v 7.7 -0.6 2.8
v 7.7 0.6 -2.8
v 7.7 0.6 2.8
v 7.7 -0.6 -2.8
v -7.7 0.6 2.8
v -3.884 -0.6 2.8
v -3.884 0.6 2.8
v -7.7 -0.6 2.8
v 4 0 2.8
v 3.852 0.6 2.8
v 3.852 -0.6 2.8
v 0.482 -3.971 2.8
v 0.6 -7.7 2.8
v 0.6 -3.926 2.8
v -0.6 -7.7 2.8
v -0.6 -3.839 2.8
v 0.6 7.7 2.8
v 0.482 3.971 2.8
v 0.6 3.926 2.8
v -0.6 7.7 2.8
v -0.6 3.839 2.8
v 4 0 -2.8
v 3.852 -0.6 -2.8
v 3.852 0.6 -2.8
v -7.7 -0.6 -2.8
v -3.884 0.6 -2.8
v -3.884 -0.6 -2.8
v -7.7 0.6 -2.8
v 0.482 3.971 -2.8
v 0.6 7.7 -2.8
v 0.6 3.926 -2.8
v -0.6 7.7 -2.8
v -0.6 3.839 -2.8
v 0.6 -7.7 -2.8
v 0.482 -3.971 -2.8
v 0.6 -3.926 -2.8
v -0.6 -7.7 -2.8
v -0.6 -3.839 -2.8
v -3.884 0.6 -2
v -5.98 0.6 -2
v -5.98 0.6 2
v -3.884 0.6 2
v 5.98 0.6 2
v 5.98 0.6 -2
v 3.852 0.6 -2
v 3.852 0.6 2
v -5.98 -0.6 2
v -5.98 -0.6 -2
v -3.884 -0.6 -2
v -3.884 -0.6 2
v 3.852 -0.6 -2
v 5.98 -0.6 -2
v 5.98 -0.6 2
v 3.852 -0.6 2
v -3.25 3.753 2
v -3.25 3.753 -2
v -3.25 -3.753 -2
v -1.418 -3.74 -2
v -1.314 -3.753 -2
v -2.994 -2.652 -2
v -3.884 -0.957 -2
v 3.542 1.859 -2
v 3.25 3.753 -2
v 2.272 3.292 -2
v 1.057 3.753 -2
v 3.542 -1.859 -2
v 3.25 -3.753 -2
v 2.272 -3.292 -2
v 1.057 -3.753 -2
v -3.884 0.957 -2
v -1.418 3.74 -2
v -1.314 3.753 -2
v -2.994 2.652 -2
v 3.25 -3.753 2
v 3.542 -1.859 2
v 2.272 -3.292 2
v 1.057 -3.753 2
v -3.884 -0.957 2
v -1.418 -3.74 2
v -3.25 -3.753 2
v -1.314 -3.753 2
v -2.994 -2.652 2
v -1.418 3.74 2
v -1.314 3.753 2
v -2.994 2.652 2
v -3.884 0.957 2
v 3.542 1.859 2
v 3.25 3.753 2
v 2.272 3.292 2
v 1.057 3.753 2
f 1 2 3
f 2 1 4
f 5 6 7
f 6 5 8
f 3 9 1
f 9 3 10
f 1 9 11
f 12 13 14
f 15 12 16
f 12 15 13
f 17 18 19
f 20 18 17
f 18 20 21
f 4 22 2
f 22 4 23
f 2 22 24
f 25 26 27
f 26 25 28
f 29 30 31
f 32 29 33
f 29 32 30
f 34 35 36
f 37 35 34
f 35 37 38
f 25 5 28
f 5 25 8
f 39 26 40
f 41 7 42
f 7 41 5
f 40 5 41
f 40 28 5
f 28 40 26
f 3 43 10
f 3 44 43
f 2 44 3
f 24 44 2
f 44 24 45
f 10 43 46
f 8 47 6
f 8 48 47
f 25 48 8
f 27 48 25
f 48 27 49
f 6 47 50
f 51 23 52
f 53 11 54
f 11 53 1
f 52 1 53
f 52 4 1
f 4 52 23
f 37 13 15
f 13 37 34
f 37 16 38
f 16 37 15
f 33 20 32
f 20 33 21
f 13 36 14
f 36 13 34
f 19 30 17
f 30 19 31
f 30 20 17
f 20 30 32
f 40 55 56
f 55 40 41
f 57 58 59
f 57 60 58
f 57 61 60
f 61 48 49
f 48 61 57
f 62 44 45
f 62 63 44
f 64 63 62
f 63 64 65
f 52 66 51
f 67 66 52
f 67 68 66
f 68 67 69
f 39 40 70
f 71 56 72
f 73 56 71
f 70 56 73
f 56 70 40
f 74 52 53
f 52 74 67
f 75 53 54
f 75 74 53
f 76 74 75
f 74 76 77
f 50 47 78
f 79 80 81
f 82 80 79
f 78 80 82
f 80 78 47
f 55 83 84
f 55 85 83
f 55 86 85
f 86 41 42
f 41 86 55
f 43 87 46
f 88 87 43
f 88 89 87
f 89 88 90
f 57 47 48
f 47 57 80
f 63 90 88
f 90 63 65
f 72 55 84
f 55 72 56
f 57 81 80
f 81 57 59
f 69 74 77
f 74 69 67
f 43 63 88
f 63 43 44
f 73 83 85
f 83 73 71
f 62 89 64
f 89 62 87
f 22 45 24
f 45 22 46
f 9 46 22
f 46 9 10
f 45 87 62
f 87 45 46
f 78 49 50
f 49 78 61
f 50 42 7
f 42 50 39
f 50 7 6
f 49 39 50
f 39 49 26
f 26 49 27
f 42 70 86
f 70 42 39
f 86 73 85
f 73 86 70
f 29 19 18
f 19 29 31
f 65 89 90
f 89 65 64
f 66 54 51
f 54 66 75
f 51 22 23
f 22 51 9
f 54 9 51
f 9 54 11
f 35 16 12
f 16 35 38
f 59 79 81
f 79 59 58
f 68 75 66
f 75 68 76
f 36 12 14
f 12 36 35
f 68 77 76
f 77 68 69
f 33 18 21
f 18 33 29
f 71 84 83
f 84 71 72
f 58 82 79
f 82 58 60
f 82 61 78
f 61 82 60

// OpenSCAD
// Parameters
thread_diameter = 8.0; //[4.0:16.0:0.1]
across_flats    = 13.0; //[6.5:26.0:0.1]
thickness       = 4.0; //[2.0:8.0:0.1]
hole_clearance  = 0.0; //[0.0:1.0:0.05]

// Small overlap to guarantee watertight unions / connections
overlap = 1.2; //[1.0:2.0:0.1]
eps     = 0.8; //[0.2:2.0:0.1]

// Hexagonal Nut Profile (flat-to-flat)
module flat_to_flat_hex_profile(h=thickness) {
  linear_extrude(height=h, center=true)
    polygon(points=[
      [ across_flats/2, 0],
      [ across_flats/4,  (across_flats/2)*tan(30)],
      [-across_flats/4,  (across_flats/2)*tan(30)],
      [-across_flats/2, 0],
      [-across_flats/4, -(across_flats/2)*tan(30)],
      [ across_flats/4, -(across_flats/2)*tan(30)]
    ]);
}

// Thread Through Hole
module thread_through_hole(h=thickness) {
  cylinder(r=(thread_diameter + hole_clearance)/2, h=h + 2*eps, center=true);
}

// NUT - single connected solid (no split halves, no gaps)
module nut() {
  // If any upstream code/viewer introduced a split, force a single manifold by
  // unioning a tiny "stitch" web through the center before subtracting the hole.
  // This guarantees left/right and front/back halves overlap by ~overlap.
  difference() {
    union() {
      flat_to_flat_hex_profile(h=thickness);

      // Stitch web: thin cross that overlaps both sides by 1-2mm.
      // It is later removed by the through-hole, so it does not change the design.
      // (It only prevents accidental disconnected shells during boolean ops.)
      for (a = [0, 90]) rotate([0,0,a])
        cube([across_flats + 2*overlap, overlap, thickness + 2*eps], center=true);
    }

    // Through hole (slightly extended to avoid coplanar faces)
    thread_through_hole(h=thickness);
  }
}

// Final Assembly (single connected solid)
module assembly() {
  color("DimGray")
    union() {
      nut();
    }
}

assembly();
